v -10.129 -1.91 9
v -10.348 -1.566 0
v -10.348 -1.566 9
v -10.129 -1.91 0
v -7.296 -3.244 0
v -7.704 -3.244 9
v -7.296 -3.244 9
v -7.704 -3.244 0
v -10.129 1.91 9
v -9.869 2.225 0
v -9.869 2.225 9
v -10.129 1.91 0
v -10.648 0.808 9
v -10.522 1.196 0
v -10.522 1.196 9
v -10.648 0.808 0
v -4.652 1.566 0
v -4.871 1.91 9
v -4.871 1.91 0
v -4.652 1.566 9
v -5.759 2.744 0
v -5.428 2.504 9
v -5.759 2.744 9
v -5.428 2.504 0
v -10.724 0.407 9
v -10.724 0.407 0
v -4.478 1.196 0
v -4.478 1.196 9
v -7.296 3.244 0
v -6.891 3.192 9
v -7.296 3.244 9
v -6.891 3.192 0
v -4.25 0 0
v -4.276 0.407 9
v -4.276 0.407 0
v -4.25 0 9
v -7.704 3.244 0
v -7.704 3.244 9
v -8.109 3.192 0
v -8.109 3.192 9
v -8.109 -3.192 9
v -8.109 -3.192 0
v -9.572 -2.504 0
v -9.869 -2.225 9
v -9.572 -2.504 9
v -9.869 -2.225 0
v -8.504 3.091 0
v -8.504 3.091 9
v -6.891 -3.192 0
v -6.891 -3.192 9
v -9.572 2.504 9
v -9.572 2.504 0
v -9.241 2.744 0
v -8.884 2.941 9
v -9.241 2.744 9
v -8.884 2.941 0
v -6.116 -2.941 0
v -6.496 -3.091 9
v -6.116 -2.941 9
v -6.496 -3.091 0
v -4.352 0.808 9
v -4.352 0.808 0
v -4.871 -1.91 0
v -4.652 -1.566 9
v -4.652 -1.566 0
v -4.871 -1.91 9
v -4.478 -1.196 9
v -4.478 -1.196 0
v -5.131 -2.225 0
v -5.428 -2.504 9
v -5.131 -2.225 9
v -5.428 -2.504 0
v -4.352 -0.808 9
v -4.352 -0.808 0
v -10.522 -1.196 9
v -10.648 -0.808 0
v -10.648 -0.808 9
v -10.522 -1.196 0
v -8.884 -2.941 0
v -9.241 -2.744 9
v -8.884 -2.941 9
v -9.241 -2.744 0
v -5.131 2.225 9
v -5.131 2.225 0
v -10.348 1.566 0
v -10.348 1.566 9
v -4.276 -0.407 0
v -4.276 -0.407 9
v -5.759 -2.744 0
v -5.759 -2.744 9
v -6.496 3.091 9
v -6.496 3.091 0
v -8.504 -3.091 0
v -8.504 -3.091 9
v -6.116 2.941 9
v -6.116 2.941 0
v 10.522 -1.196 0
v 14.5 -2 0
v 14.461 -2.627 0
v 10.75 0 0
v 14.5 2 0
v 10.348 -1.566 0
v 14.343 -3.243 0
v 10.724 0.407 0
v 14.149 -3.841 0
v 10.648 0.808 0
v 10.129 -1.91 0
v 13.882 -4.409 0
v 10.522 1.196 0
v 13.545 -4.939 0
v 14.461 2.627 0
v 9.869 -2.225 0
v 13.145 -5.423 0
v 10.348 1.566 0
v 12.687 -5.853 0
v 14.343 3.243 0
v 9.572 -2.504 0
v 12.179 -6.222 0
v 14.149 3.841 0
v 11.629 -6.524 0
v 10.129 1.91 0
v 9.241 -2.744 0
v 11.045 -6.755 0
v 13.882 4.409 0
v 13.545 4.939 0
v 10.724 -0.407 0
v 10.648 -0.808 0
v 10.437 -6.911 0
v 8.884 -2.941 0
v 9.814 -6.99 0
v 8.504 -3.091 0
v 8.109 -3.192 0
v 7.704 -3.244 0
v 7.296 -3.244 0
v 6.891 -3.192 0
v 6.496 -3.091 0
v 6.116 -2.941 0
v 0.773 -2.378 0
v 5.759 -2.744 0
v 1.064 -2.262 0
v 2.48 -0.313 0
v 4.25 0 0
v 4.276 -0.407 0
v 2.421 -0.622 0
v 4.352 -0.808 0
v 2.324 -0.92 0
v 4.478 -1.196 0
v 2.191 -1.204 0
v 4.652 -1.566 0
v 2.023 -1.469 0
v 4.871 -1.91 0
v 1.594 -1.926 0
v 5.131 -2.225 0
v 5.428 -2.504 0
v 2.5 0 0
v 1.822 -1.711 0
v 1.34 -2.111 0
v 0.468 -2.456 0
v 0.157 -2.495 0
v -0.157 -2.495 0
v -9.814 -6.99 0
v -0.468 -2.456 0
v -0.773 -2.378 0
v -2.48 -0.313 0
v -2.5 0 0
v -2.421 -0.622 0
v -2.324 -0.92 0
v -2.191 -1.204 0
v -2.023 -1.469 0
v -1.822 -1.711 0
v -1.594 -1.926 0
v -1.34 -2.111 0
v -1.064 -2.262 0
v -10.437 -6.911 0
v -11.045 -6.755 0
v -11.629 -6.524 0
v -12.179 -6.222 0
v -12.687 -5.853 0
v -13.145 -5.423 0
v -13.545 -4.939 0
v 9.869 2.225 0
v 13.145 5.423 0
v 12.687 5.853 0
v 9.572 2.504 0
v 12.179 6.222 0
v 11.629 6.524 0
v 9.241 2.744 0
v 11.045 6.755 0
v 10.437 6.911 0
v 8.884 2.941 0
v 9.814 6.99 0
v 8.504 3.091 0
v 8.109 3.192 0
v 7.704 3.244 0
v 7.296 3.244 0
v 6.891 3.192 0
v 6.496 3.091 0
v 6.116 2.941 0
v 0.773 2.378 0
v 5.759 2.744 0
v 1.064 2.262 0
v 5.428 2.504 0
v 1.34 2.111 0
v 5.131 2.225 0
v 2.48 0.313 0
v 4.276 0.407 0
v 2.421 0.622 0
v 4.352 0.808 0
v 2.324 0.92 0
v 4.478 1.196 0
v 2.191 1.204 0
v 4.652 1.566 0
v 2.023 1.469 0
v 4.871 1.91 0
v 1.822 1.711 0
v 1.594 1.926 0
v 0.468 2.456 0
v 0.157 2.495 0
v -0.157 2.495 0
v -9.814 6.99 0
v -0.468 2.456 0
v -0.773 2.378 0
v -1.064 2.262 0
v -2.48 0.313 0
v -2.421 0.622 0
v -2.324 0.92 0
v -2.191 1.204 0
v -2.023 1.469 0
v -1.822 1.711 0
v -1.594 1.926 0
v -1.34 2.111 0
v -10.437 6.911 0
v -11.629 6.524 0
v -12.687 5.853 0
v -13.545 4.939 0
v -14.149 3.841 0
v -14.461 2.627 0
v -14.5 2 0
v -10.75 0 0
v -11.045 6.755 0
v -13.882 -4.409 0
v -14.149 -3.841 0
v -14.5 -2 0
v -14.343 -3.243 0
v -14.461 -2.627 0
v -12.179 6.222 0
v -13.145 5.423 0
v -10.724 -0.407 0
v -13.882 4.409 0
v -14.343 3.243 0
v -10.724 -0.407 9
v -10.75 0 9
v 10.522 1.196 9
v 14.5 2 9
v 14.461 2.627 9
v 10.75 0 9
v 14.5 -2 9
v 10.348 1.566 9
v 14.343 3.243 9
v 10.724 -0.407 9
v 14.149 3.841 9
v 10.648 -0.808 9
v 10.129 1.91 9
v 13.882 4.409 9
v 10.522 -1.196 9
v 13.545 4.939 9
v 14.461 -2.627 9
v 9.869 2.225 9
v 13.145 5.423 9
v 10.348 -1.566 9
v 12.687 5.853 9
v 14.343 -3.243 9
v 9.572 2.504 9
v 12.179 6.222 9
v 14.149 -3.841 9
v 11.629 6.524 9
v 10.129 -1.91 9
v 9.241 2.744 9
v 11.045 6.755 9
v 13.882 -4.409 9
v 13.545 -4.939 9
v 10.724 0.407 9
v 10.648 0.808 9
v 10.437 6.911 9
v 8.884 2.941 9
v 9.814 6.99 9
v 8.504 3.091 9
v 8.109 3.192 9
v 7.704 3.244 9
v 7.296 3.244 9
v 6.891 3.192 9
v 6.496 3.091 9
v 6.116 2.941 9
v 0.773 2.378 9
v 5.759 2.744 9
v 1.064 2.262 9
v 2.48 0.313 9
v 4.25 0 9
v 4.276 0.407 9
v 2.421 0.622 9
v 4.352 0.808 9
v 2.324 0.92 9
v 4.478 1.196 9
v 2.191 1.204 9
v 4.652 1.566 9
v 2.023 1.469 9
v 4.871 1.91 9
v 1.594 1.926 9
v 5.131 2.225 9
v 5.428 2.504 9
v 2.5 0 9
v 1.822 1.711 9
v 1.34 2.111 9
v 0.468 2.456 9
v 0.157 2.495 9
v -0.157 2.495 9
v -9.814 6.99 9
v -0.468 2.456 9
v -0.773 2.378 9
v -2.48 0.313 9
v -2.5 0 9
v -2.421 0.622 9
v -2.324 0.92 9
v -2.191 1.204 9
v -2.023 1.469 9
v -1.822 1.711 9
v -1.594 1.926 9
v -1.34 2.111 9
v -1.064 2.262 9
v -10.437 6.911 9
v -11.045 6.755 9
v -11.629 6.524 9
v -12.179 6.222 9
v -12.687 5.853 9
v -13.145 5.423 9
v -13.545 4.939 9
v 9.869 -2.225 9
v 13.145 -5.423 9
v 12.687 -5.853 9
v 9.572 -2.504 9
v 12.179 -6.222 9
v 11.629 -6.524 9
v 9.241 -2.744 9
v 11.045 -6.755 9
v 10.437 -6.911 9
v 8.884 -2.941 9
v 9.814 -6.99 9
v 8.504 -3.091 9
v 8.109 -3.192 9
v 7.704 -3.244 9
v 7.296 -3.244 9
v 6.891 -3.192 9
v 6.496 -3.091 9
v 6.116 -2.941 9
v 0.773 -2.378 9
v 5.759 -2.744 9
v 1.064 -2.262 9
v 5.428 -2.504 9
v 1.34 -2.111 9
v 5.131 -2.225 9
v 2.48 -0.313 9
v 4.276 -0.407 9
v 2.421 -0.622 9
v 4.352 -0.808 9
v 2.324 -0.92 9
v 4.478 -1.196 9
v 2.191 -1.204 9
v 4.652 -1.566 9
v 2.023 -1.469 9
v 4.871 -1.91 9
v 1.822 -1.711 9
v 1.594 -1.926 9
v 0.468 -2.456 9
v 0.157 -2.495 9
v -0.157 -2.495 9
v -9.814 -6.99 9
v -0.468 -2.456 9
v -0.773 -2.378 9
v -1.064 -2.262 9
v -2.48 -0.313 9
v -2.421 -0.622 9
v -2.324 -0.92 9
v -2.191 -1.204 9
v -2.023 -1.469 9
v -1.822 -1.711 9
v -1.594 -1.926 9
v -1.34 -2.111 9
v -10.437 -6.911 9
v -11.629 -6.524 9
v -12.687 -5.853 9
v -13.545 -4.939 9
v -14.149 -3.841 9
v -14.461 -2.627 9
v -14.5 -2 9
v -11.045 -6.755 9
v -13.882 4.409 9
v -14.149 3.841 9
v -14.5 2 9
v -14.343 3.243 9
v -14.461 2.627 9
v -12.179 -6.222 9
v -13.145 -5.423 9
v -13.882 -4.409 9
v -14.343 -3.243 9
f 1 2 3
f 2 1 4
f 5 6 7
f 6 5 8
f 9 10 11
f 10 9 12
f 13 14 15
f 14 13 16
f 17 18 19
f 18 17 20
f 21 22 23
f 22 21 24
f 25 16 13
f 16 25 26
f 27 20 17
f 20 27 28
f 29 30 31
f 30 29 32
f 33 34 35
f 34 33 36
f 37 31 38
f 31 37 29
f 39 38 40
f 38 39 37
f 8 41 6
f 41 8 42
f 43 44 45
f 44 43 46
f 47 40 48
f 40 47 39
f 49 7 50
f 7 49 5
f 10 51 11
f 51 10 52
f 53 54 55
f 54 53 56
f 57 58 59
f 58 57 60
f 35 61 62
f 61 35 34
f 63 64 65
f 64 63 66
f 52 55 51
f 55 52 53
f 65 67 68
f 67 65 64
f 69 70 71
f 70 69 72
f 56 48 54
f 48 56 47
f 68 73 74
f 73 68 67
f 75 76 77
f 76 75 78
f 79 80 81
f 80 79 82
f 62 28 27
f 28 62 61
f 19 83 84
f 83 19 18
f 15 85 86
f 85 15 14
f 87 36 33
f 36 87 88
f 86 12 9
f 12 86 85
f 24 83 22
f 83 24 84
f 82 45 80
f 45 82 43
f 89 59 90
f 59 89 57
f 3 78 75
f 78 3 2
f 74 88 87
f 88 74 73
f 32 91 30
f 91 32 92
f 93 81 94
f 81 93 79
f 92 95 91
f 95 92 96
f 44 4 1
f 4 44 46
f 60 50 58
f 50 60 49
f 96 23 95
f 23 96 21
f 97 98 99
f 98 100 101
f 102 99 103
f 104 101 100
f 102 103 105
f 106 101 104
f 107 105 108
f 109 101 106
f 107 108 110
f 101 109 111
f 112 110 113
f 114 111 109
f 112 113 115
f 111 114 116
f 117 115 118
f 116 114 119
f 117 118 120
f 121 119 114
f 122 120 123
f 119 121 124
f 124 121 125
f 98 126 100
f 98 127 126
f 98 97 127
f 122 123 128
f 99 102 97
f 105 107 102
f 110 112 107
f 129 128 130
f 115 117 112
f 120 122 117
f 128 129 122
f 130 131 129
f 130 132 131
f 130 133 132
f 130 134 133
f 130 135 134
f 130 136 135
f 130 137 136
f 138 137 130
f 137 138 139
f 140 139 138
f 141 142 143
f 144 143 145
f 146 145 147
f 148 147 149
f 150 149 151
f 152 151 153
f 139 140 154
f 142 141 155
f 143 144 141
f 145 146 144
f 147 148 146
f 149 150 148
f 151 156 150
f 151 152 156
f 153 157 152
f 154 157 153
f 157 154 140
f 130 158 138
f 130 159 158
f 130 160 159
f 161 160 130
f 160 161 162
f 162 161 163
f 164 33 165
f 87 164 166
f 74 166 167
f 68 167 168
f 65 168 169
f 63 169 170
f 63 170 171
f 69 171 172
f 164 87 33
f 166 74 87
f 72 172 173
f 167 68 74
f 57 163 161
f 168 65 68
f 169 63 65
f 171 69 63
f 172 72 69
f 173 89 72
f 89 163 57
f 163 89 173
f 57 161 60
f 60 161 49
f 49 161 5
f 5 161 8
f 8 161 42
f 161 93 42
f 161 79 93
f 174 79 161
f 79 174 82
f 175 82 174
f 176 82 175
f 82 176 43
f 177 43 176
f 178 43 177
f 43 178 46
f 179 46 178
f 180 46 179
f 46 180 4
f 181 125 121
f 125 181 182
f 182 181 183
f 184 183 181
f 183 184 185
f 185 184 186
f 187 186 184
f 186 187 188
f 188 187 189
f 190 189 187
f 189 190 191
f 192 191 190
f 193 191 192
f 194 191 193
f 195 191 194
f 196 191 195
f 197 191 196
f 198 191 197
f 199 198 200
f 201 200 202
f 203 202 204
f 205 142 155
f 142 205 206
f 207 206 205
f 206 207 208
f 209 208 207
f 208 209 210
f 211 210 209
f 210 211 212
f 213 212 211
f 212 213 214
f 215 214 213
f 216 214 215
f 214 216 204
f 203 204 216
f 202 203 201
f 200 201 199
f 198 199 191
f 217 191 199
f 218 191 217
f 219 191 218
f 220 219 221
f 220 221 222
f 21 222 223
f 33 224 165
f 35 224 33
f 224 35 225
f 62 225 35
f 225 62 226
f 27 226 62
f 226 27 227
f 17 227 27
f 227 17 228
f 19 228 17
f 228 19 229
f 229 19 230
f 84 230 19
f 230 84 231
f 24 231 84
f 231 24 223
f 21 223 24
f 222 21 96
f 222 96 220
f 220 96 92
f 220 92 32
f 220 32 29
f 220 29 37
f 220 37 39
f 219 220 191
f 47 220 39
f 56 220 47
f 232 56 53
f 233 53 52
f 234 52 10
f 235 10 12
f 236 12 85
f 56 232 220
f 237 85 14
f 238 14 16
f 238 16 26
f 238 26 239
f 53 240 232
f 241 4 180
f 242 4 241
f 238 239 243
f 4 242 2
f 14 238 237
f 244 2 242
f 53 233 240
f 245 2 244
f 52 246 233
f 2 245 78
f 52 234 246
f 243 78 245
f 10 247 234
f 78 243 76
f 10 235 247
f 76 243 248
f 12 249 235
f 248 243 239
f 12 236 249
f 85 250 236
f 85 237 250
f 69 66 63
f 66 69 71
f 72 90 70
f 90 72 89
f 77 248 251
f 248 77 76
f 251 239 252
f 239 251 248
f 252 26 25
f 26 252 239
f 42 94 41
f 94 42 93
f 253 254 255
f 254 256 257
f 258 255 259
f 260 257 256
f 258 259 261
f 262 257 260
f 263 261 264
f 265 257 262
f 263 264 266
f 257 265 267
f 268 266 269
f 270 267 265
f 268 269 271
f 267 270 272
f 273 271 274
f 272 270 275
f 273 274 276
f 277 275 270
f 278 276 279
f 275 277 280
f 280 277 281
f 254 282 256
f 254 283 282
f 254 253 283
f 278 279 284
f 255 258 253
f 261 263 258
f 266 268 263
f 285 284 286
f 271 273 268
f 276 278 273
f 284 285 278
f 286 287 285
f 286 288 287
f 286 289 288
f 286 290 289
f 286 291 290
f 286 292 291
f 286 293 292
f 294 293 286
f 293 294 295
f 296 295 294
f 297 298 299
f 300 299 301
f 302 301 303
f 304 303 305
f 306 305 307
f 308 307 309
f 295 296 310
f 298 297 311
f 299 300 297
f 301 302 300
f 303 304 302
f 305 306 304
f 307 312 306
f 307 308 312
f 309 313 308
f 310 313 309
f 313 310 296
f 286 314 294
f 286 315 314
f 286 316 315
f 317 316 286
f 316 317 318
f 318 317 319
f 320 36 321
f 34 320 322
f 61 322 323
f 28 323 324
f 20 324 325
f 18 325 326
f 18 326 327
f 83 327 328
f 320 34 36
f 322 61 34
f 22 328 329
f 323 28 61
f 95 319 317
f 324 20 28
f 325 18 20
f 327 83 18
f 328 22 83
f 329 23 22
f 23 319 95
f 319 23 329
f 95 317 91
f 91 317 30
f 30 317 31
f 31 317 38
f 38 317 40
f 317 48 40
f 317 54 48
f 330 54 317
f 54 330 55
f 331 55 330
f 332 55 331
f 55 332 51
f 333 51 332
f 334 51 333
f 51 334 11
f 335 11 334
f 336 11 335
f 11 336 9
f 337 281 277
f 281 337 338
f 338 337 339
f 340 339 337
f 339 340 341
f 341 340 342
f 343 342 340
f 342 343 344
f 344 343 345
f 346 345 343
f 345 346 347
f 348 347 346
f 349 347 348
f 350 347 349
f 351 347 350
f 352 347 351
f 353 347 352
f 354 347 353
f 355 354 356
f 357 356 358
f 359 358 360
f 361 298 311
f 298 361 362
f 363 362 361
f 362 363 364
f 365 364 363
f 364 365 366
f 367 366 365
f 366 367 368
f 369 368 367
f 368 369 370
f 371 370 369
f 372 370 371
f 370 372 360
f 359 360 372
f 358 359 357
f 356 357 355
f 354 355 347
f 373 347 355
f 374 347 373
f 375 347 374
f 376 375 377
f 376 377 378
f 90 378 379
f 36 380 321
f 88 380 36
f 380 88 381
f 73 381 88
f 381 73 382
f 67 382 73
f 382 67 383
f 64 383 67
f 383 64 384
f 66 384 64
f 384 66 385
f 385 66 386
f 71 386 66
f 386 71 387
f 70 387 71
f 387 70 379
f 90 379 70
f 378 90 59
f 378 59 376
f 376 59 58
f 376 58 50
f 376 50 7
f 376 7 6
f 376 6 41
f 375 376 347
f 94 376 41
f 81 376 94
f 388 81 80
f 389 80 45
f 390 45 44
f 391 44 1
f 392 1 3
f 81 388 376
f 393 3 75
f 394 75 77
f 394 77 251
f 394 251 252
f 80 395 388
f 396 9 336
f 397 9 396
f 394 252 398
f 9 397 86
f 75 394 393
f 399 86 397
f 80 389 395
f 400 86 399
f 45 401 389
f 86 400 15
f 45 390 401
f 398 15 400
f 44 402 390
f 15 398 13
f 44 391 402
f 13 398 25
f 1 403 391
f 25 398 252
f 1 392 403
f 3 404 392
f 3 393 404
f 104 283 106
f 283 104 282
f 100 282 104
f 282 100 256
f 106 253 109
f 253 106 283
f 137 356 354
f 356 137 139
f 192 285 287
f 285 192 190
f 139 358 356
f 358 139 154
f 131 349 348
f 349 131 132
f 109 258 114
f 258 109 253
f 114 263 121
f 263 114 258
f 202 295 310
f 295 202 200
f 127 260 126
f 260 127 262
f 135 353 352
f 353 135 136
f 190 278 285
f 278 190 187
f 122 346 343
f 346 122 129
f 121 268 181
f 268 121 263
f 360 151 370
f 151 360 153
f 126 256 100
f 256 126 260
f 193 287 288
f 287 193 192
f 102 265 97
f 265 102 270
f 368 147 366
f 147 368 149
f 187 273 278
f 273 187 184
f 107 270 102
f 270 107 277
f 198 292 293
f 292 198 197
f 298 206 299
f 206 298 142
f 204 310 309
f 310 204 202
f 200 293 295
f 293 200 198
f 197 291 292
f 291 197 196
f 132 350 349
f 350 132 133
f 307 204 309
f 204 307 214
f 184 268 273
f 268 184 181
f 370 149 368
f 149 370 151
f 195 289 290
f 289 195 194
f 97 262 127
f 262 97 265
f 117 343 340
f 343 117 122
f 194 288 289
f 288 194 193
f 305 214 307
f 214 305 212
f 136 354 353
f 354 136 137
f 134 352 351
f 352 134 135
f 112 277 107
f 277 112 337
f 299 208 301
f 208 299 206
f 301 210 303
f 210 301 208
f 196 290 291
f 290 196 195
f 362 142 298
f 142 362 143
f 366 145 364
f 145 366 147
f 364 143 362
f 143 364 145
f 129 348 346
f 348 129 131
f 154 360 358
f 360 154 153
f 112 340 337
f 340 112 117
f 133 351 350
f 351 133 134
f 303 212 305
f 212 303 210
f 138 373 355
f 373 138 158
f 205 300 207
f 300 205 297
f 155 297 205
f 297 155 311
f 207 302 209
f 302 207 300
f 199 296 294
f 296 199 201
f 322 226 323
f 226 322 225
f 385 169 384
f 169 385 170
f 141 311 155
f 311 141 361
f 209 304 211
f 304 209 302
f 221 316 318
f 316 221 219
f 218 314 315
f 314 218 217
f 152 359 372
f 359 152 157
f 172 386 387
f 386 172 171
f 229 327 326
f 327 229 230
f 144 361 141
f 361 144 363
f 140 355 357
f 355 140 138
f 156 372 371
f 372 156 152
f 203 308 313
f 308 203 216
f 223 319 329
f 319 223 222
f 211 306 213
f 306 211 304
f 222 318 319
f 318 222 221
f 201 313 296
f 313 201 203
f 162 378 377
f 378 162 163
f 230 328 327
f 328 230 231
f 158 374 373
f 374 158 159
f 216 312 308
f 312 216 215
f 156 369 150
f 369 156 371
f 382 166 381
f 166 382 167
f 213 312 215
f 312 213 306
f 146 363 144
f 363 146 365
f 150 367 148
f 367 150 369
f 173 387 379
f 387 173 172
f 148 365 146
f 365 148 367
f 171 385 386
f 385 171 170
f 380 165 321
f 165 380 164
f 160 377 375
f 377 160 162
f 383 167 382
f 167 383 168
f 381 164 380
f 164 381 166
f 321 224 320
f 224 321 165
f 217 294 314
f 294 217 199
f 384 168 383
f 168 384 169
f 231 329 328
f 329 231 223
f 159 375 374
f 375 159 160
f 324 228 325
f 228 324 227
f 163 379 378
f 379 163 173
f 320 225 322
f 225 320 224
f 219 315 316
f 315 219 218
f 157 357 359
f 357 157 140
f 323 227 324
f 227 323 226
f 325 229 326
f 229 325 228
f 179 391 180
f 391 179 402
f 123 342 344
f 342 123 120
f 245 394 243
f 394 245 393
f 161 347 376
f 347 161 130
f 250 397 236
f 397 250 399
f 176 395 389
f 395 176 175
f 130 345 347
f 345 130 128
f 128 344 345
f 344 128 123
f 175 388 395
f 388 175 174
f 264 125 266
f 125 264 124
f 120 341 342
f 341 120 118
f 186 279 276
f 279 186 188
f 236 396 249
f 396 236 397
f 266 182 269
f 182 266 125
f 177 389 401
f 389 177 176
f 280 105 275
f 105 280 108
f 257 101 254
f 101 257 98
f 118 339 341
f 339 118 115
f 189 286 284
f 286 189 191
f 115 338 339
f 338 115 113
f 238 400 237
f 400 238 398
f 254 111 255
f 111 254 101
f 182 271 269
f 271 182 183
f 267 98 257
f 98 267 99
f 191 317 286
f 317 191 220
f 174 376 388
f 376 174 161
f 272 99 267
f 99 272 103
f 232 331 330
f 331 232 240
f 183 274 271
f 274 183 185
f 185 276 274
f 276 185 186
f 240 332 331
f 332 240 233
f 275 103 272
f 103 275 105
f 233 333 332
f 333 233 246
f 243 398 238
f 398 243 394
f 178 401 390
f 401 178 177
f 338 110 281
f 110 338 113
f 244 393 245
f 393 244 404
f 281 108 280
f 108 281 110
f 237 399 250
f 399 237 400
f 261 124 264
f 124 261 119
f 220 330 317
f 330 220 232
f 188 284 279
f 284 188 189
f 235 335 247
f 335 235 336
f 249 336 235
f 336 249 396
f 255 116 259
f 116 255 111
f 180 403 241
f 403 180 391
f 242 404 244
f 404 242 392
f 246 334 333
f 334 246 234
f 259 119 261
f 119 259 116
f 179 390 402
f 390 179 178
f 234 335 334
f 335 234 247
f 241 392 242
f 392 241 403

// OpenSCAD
$fn = 50;

difference() {
	union() {
		hull() {
			translate(v = [-9.5, 2.0, 0]) {
				cylinder(h = 9, r = 5);
			}
			translate(v = [9.5, 2.0, 0]) {
				cylinder(h = 9, r = 5);
			}
			translate(v = [-9.5, -2.0, 0]) {
				cylinder(h = 9, r = 5);
			}
			translate(v = [9.5, -2.0, 0]) {
				cylinder(h = 9, r = 5);
			}
		}
	}
	union() {
		translate(v = [-7.5, 0.0, 0]) {
			cylinder(h = 9, r = 3.25);
		}
		translate(v = [7.5, 0.0, 0]) {
			cylinder(h = 9, r = 3.25);
		}
		cylinder(h = 9, r = 2.5);
	}
}
